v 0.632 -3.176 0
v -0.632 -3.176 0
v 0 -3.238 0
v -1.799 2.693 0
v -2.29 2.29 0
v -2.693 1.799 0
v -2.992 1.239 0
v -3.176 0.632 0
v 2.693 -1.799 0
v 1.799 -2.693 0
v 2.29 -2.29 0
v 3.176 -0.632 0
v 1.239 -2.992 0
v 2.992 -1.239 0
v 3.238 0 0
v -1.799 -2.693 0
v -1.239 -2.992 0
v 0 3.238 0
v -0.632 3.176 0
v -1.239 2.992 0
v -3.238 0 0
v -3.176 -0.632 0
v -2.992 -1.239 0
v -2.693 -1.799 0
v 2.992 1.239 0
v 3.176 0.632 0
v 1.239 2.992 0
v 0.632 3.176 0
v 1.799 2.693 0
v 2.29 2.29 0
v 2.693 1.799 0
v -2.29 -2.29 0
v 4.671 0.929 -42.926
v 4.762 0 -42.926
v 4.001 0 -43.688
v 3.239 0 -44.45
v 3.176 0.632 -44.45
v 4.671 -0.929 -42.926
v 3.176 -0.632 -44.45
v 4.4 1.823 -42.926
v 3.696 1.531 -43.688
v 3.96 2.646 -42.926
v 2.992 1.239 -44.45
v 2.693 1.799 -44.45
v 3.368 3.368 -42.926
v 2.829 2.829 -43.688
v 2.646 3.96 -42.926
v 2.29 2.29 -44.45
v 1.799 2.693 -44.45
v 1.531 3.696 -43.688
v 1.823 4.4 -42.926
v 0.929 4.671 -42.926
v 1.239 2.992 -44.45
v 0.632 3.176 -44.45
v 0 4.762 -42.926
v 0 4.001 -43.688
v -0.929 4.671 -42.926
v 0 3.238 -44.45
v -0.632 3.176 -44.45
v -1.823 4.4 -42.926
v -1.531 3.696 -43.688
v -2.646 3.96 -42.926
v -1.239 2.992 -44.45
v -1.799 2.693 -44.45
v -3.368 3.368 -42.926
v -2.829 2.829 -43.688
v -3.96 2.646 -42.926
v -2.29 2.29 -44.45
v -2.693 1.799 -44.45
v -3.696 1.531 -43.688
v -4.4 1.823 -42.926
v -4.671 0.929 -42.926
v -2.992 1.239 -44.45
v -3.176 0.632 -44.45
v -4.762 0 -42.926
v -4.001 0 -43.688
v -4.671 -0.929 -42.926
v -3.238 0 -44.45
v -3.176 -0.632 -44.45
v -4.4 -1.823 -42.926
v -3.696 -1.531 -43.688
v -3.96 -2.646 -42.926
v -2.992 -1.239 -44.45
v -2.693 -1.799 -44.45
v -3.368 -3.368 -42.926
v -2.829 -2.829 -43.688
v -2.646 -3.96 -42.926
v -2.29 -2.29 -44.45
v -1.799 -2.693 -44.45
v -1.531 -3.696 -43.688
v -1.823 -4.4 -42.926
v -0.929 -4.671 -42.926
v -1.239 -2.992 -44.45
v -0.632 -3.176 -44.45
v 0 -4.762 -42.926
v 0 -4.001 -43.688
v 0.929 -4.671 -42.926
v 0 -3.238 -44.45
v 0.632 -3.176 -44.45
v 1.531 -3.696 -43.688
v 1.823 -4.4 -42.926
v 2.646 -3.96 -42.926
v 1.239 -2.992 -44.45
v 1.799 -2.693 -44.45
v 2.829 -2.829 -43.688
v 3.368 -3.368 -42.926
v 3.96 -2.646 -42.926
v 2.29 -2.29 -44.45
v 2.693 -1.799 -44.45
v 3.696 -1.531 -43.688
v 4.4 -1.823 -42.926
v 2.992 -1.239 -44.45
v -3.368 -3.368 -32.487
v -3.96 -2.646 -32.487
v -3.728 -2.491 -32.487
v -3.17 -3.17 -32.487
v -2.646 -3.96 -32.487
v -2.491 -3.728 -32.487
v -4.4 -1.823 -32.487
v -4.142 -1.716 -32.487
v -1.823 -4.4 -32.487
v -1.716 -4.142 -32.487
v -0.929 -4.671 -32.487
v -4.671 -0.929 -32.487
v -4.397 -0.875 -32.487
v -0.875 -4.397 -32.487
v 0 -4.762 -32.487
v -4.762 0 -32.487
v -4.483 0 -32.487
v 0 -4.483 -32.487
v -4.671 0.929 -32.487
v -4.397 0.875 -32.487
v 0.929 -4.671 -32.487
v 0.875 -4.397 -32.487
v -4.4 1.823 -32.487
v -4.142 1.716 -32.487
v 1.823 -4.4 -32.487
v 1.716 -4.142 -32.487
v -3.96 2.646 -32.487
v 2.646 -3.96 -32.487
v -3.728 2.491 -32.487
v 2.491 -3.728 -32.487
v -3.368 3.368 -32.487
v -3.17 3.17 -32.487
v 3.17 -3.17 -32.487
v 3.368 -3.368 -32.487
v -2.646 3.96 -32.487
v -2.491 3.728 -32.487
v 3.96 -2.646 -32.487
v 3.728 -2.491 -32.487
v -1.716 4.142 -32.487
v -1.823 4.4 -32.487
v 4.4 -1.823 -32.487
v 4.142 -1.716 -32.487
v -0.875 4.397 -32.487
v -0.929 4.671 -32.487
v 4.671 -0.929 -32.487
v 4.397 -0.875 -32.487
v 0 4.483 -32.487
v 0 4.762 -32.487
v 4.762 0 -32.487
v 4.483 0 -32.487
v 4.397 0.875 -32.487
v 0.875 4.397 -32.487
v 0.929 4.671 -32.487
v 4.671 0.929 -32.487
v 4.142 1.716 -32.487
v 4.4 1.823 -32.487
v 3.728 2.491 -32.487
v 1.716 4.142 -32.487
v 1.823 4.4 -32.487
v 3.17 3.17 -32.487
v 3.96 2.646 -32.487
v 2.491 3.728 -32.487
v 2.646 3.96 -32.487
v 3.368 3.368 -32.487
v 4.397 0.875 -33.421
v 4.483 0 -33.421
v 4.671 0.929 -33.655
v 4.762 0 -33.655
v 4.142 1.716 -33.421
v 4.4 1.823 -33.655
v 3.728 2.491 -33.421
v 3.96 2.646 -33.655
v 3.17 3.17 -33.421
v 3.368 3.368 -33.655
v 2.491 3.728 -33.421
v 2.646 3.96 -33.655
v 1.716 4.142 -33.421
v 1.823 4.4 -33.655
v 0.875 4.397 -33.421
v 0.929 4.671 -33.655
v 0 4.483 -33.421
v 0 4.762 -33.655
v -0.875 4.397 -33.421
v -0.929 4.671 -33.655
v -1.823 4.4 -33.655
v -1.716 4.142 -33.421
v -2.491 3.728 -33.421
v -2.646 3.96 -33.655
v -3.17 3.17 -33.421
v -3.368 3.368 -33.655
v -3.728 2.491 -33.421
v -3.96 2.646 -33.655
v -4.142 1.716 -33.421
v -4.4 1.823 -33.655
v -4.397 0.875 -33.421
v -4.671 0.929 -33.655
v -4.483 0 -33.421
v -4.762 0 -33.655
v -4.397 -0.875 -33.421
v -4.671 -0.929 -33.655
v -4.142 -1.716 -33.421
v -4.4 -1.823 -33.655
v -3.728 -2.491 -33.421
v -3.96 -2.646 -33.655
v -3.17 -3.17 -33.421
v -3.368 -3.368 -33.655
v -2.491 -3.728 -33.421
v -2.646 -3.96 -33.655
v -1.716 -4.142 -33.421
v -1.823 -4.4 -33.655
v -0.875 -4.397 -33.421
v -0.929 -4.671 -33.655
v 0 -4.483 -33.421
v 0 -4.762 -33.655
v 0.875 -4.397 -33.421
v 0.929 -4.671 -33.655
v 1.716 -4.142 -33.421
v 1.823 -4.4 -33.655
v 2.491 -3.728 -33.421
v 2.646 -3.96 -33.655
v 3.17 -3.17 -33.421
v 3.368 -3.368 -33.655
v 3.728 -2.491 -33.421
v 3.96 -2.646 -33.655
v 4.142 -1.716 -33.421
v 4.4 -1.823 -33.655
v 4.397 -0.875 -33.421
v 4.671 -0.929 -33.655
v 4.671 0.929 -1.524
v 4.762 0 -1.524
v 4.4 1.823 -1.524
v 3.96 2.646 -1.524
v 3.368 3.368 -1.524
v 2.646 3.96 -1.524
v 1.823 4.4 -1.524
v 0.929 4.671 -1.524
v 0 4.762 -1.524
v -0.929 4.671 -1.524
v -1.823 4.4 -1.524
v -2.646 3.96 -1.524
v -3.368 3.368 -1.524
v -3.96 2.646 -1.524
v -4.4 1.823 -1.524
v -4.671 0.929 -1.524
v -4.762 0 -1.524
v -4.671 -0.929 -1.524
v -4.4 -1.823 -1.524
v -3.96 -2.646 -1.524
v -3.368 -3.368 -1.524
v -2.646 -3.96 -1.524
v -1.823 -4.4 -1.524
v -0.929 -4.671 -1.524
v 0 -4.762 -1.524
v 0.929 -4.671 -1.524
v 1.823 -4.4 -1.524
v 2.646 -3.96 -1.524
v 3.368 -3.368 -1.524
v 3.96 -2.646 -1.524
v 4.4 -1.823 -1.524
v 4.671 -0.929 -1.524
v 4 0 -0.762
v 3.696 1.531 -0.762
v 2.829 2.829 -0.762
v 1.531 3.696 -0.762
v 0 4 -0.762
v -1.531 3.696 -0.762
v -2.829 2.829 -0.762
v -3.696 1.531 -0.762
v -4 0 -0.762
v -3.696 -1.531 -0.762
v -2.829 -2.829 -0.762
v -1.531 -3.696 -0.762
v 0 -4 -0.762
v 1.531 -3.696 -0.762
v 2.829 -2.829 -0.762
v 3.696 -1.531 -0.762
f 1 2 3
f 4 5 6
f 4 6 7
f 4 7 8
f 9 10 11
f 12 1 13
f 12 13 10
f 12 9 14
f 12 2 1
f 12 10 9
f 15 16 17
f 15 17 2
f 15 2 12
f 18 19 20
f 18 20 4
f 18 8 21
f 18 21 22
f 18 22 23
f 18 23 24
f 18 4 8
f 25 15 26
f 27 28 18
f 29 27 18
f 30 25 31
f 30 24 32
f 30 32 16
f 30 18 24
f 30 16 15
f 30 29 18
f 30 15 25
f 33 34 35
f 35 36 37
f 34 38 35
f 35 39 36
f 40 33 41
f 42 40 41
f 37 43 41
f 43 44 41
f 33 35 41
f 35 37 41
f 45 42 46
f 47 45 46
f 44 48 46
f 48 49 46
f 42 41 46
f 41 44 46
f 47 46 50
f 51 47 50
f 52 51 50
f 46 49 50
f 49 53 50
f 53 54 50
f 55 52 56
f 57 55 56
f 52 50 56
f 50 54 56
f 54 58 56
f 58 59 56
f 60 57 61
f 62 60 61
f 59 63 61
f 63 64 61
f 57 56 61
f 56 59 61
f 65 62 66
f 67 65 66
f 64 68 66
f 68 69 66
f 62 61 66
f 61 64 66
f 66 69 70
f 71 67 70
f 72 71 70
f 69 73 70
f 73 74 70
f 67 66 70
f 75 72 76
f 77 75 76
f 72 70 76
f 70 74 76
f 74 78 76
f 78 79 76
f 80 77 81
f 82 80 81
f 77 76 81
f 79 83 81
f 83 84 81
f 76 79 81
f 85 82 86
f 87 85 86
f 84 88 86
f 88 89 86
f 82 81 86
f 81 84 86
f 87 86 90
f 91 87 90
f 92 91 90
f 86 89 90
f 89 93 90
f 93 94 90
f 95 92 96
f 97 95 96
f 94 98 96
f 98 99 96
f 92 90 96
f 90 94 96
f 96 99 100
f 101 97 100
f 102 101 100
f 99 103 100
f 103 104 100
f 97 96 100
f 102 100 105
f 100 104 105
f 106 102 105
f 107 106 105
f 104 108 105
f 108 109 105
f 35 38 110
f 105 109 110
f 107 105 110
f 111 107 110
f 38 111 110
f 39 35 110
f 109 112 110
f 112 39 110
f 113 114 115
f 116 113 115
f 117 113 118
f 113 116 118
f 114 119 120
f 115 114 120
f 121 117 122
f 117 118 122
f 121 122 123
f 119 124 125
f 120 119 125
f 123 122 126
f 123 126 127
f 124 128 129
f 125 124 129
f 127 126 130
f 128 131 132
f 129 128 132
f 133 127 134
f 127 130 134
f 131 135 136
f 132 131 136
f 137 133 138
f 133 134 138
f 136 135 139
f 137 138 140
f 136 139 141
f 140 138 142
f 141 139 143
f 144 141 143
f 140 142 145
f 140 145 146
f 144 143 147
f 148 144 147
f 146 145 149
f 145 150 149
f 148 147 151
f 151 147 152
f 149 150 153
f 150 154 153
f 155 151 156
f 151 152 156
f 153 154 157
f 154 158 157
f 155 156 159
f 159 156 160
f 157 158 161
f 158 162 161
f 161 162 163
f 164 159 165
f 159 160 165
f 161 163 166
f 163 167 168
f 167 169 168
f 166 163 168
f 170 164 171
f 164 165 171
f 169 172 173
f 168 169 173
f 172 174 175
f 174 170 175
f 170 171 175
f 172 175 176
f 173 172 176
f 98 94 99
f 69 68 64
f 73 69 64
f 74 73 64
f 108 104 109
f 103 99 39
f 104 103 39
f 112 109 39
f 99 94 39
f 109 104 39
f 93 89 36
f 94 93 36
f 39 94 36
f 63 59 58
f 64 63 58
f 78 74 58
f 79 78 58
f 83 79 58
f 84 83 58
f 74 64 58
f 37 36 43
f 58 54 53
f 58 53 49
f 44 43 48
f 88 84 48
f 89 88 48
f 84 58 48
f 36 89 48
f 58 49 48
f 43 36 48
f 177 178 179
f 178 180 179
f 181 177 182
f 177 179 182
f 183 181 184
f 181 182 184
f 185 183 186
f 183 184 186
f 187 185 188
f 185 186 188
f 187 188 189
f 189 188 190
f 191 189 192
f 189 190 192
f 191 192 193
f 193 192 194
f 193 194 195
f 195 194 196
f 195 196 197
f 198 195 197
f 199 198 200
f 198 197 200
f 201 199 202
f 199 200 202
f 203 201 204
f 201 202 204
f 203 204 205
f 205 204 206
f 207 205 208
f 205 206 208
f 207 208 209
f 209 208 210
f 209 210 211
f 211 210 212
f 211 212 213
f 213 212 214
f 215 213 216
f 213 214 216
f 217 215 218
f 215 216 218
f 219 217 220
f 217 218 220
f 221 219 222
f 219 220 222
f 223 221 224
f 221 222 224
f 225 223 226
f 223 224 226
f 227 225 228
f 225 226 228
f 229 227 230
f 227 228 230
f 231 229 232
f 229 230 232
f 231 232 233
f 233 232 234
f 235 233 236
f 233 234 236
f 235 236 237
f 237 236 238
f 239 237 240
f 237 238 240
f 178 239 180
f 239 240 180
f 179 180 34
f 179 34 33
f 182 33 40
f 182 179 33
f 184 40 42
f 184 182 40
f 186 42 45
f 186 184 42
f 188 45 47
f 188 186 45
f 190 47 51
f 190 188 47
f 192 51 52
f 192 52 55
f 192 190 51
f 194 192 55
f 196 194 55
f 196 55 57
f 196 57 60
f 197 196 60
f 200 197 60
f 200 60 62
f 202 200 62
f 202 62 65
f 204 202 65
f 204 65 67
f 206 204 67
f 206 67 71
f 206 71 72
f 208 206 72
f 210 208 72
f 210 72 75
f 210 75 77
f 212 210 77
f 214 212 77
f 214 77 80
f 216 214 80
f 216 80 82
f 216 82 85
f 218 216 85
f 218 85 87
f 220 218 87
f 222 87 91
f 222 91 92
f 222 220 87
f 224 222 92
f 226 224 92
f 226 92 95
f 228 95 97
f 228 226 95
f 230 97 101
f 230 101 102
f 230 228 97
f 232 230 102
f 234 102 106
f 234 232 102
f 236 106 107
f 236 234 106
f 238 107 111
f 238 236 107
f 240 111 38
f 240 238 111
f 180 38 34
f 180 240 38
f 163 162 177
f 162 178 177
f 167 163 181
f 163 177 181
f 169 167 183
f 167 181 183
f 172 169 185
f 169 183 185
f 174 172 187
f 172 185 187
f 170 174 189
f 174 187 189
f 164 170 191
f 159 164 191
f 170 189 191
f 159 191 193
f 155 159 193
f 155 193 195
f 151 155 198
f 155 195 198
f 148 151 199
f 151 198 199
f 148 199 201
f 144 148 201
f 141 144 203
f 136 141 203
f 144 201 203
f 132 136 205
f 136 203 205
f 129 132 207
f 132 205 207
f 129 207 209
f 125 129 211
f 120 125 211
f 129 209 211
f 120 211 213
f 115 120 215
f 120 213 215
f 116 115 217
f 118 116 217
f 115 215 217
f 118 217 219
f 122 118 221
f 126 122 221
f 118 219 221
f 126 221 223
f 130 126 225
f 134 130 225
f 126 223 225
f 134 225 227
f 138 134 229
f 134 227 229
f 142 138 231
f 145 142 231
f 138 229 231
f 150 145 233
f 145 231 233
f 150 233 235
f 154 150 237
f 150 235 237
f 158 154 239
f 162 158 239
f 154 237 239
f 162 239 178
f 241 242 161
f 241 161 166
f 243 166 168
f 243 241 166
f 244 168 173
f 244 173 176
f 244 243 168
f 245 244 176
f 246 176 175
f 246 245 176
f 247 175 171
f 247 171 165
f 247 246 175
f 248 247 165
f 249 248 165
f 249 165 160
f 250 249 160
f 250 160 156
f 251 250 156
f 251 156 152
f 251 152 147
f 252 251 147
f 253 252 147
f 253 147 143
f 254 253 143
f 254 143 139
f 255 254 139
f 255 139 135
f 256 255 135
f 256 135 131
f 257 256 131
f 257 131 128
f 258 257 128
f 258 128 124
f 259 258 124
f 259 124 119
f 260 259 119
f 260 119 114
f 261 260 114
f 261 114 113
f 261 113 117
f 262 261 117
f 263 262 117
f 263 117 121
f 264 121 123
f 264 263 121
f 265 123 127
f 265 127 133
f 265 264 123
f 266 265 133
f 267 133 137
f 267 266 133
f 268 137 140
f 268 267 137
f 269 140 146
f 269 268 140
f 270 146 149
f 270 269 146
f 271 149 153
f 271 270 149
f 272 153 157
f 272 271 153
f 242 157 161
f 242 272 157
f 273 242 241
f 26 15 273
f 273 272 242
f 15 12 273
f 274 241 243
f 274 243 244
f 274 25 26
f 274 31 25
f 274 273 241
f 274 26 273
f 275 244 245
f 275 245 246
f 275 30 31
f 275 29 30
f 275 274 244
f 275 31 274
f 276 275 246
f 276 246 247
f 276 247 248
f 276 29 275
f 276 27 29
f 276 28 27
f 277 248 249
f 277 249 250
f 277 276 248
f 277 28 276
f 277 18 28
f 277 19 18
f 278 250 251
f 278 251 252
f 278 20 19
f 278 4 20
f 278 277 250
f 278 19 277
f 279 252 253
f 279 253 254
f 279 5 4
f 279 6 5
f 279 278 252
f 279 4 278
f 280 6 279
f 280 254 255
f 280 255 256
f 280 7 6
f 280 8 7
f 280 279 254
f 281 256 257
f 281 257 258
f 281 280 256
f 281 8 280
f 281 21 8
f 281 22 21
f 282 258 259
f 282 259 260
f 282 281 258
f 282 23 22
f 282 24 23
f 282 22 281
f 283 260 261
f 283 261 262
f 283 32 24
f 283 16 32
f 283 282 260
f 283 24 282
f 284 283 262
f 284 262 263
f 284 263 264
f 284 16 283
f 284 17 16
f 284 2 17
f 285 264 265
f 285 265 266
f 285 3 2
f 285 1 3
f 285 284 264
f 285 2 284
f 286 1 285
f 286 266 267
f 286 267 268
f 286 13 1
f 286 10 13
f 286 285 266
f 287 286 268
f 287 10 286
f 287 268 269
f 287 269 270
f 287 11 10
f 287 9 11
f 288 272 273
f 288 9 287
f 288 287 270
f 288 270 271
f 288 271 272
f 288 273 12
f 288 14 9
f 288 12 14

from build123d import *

# Parameters (mm, degrees)
SKETCH1_R           = 4.7625
BOSS_EXTRUDE1_DEPTH = 44.45
CHAMFER1_SIZE       = 1.524


with BuildPart() as part:
    # Sketch1 → Boss-Extrude1 (new body)
    with BuildSketch(Plane.XY):
        Circle(SKETCH1_R)
    extrude(amount=-BOSS_EXTRUDE1_DEPTH)

    # Sketch2 → Cut-Revolve1 (revolve, cut)
    with BuildSketch(Plane(origin=(0, 0, 0), x_dir=(1, 0, 0), z_dir=(0, 1, 0)), mode=Mode.PRIVATE) as cut_revolve1_sk:
        Polygon((-4.7625, 33.655), (-4.7625, 32.4866), (-4.4831, 32.4866), (-4.4831, 33.420555563), align=None)
    revolve(cut_revolve1_sk.sketch.rotate(Axis((0, 0, -44.45), (0, 0, 1)), 180), axis=Axis((0, 0, -44.45), (0, 0, 1)), mode=Mode.SUBTRACT)

    # Chamfer1
    chamfer1_edges = [part.edges().sort_by_distance(p)[0] for p in [
        (-4.7625, 0, 0),
        (-4.7625, 0, -44.45),
    ]]
    chamfer(chamfer1_edges, length=CHAMFER1_SIZE)


solid = part.part
